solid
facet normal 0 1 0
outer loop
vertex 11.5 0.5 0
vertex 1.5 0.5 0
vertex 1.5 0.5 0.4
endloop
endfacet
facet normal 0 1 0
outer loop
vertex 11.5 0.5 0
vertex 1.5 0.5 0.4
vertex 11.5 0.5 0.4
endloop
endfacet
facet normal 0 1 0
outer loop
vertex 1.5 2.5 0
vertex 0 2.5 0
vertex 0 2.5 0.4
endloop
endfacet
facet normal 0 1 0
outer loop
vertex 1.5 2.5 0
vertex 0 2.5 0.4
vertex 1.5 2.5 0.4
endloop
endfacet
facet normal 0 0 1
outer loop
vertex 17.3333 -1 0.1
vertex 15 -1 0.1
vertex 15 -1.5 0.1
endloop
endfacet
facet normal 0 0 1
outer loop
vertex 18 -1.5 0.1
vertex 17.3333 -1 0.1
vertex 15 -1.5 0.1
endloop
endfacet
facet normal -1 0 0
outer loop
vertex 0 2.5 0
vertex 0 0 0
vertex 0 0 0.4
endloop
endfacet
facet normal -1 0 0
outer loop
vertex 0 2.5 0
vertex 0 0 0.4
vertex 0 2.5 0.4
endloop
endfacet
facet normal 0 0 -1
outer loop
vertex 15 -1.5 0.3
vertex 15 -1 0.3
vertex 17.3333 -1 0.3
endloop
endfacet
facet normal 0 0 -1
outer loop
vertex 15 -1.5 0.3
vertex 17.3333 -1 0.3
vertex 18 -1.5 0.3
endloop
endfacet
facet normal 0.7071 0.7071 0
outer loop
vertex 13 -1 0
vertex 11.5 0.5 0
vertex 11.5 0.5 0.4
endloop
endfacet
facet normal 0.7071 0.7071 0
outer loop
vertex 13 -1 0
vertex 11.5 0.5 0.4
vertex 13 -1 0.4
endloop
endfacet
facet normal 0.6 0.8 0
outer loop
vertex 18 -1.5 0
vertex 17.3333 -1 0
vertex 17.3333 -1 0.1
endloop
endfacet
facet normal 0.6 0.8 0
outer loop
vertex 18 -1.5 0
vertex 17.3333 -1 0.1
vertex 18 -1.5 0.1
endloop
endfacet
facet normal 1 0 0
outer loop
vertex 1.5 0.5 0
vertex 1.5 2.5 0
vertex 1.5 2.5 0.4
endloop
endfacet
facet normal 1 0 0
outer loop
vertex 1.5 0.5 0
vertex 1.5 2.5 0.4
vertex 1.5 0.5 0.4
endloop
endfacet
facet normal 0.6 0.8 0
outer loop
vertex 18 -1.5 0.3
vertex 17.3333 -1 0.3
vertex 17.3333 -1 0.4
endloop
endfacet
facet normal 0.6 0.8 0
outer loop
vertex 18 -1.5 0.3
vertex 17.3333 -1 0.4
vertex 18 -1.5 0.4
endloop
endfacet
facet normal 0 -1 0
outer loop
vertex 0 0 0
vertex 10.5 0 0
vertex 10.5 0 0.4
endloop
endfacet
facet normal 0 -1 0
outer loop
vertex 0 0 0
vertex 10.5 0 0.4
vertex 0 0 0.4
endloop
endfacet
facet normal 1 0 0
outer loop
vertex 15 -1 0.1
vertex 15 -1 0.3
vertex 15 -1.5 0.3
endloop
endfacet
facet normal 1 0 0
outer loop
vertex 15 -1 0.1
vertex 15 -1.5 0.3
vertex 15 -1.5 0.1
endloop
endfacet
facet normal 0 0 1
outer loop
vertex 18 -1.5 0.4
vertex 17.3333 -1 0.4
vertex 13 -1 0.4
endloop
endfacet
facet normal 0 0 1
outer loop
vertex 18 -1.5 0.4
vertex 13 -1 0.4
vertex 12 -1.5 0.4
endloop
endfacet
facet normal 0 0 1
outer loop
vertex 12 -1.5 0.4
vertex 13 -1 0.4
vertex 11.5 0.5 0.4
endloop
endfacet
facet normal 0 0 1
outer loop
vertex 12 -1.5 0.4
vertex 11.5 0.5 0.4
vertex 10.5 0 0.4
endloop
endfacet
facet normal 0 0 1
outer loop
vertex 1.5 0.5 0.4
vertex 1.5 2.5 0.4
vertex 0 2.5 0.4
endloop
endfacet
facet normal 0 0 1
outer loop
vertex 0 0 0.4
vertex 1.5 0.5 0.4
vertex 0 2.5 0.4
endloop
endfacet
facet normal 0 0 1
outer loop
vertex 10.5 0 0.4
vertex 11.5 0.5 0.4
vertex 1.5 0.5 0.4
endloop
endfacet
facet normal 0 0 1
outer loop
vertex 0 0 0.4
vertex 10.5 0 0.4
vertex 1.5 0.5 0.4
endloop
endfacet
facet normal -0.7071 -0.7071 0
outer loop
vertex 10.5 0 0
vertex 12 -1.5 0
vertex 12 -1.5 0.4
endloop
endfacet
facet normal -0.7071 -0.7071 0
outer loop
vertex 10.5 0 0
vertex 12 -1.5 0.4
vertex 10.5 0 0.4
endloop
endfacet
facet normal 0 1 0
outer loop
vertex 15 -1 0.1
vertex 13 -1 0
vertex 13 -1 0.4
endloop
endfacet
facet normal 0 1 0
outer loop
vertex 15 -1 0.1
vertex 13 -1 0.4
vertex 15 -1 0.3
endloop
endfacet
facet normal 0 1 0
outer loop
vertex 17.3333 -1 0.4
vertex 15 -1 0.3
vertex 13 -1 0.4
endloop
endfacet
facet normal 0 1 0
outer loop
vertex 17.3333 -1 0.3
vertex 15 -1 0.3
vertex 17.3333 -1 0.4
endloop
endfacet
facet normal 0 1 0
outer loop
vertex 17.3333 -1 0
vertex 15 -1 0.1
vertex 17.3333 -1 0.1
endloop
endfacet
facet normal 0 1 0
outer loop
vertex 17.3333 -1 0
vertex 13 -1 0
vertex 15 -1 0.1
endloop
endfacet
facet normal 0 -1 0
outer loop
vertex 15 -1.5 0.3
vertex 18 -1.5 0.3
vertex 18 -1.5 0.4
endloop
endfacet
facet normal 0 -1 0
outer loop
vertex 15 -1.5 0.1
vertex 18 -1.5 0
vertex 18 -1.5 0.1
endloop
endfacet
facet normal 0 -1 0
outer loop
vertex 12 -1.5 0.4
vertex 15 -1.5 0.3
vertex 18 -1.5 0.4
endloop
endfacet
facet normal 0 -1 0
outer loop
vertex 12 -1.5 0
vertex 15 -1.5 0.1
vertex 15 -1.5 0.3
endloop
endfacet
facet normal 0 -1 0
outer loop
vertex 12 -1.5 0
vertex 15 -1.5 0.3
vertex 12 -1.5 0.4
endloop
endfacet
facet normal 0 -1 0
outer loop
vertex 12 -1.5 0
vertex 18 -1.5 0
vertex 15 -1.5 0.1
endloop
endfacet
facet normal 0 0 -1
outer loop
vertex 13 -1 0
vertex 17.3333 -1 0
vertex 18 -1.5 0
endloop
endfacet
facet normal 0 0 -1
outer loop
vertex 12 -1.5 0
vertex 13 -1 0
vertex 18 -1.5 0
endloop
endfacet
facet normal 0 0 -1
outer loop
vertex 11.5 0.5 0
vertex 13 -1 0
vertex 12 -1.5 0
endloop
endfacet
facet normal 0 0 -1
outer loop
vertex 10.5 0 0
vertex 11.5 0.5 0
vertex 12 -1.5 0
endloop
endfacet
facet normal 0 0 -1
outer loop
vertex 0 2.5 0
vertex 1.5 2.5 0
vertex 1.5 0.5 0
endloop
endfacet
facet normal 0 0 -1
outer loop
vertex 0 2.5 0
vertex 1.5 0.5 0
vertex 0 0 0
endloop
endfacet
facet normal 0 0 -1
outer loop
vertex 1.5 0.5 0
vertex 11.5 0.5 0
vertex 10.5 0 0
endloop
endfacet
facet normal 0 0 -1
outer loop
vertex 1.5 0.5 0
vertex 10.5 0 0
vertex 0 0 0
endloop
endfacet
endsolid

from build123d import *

# Parameters (mm, degrees)
BOSS_EXTRUDE1_DEPTH = 0.4
SKETCH5_W           = 3
SKETCH5_H           = 0.2
CUT_EXTRUDE1_DEPTH  = 0.7


with BuildPart() as part:
    # Sketch3 → Boss-Extrude1 (new body)
    with BuildSketch(Plane.XY):
        Polygon((0, 0), (0, 2.5), (1.5, 2.5), (1.5, 0.5), (11.5, 0.5), (13, -1), (17.333333334, -1), (18, -1.5), (12, -1.5), (10.5, 0), align=None)
    extrude(amount=BOSS_EXTRUDE1_DEPTH)

    # Sketch5 → Cut-Extrude1 (cut)
    with BuildSketch(Plane(origin=(0, -1, 0), x_dir=(1, 0, 0), z_dir=(0, 1, 0))):
        with Locations((16.5, -0.2)):
            Rectangle(SKETCH5_W, SKETCH5_H)
    extrude(amount=-CUT_EXTRUDE1_DEPTH, mode=Mode.SUBTRACT)


solid = part.part
